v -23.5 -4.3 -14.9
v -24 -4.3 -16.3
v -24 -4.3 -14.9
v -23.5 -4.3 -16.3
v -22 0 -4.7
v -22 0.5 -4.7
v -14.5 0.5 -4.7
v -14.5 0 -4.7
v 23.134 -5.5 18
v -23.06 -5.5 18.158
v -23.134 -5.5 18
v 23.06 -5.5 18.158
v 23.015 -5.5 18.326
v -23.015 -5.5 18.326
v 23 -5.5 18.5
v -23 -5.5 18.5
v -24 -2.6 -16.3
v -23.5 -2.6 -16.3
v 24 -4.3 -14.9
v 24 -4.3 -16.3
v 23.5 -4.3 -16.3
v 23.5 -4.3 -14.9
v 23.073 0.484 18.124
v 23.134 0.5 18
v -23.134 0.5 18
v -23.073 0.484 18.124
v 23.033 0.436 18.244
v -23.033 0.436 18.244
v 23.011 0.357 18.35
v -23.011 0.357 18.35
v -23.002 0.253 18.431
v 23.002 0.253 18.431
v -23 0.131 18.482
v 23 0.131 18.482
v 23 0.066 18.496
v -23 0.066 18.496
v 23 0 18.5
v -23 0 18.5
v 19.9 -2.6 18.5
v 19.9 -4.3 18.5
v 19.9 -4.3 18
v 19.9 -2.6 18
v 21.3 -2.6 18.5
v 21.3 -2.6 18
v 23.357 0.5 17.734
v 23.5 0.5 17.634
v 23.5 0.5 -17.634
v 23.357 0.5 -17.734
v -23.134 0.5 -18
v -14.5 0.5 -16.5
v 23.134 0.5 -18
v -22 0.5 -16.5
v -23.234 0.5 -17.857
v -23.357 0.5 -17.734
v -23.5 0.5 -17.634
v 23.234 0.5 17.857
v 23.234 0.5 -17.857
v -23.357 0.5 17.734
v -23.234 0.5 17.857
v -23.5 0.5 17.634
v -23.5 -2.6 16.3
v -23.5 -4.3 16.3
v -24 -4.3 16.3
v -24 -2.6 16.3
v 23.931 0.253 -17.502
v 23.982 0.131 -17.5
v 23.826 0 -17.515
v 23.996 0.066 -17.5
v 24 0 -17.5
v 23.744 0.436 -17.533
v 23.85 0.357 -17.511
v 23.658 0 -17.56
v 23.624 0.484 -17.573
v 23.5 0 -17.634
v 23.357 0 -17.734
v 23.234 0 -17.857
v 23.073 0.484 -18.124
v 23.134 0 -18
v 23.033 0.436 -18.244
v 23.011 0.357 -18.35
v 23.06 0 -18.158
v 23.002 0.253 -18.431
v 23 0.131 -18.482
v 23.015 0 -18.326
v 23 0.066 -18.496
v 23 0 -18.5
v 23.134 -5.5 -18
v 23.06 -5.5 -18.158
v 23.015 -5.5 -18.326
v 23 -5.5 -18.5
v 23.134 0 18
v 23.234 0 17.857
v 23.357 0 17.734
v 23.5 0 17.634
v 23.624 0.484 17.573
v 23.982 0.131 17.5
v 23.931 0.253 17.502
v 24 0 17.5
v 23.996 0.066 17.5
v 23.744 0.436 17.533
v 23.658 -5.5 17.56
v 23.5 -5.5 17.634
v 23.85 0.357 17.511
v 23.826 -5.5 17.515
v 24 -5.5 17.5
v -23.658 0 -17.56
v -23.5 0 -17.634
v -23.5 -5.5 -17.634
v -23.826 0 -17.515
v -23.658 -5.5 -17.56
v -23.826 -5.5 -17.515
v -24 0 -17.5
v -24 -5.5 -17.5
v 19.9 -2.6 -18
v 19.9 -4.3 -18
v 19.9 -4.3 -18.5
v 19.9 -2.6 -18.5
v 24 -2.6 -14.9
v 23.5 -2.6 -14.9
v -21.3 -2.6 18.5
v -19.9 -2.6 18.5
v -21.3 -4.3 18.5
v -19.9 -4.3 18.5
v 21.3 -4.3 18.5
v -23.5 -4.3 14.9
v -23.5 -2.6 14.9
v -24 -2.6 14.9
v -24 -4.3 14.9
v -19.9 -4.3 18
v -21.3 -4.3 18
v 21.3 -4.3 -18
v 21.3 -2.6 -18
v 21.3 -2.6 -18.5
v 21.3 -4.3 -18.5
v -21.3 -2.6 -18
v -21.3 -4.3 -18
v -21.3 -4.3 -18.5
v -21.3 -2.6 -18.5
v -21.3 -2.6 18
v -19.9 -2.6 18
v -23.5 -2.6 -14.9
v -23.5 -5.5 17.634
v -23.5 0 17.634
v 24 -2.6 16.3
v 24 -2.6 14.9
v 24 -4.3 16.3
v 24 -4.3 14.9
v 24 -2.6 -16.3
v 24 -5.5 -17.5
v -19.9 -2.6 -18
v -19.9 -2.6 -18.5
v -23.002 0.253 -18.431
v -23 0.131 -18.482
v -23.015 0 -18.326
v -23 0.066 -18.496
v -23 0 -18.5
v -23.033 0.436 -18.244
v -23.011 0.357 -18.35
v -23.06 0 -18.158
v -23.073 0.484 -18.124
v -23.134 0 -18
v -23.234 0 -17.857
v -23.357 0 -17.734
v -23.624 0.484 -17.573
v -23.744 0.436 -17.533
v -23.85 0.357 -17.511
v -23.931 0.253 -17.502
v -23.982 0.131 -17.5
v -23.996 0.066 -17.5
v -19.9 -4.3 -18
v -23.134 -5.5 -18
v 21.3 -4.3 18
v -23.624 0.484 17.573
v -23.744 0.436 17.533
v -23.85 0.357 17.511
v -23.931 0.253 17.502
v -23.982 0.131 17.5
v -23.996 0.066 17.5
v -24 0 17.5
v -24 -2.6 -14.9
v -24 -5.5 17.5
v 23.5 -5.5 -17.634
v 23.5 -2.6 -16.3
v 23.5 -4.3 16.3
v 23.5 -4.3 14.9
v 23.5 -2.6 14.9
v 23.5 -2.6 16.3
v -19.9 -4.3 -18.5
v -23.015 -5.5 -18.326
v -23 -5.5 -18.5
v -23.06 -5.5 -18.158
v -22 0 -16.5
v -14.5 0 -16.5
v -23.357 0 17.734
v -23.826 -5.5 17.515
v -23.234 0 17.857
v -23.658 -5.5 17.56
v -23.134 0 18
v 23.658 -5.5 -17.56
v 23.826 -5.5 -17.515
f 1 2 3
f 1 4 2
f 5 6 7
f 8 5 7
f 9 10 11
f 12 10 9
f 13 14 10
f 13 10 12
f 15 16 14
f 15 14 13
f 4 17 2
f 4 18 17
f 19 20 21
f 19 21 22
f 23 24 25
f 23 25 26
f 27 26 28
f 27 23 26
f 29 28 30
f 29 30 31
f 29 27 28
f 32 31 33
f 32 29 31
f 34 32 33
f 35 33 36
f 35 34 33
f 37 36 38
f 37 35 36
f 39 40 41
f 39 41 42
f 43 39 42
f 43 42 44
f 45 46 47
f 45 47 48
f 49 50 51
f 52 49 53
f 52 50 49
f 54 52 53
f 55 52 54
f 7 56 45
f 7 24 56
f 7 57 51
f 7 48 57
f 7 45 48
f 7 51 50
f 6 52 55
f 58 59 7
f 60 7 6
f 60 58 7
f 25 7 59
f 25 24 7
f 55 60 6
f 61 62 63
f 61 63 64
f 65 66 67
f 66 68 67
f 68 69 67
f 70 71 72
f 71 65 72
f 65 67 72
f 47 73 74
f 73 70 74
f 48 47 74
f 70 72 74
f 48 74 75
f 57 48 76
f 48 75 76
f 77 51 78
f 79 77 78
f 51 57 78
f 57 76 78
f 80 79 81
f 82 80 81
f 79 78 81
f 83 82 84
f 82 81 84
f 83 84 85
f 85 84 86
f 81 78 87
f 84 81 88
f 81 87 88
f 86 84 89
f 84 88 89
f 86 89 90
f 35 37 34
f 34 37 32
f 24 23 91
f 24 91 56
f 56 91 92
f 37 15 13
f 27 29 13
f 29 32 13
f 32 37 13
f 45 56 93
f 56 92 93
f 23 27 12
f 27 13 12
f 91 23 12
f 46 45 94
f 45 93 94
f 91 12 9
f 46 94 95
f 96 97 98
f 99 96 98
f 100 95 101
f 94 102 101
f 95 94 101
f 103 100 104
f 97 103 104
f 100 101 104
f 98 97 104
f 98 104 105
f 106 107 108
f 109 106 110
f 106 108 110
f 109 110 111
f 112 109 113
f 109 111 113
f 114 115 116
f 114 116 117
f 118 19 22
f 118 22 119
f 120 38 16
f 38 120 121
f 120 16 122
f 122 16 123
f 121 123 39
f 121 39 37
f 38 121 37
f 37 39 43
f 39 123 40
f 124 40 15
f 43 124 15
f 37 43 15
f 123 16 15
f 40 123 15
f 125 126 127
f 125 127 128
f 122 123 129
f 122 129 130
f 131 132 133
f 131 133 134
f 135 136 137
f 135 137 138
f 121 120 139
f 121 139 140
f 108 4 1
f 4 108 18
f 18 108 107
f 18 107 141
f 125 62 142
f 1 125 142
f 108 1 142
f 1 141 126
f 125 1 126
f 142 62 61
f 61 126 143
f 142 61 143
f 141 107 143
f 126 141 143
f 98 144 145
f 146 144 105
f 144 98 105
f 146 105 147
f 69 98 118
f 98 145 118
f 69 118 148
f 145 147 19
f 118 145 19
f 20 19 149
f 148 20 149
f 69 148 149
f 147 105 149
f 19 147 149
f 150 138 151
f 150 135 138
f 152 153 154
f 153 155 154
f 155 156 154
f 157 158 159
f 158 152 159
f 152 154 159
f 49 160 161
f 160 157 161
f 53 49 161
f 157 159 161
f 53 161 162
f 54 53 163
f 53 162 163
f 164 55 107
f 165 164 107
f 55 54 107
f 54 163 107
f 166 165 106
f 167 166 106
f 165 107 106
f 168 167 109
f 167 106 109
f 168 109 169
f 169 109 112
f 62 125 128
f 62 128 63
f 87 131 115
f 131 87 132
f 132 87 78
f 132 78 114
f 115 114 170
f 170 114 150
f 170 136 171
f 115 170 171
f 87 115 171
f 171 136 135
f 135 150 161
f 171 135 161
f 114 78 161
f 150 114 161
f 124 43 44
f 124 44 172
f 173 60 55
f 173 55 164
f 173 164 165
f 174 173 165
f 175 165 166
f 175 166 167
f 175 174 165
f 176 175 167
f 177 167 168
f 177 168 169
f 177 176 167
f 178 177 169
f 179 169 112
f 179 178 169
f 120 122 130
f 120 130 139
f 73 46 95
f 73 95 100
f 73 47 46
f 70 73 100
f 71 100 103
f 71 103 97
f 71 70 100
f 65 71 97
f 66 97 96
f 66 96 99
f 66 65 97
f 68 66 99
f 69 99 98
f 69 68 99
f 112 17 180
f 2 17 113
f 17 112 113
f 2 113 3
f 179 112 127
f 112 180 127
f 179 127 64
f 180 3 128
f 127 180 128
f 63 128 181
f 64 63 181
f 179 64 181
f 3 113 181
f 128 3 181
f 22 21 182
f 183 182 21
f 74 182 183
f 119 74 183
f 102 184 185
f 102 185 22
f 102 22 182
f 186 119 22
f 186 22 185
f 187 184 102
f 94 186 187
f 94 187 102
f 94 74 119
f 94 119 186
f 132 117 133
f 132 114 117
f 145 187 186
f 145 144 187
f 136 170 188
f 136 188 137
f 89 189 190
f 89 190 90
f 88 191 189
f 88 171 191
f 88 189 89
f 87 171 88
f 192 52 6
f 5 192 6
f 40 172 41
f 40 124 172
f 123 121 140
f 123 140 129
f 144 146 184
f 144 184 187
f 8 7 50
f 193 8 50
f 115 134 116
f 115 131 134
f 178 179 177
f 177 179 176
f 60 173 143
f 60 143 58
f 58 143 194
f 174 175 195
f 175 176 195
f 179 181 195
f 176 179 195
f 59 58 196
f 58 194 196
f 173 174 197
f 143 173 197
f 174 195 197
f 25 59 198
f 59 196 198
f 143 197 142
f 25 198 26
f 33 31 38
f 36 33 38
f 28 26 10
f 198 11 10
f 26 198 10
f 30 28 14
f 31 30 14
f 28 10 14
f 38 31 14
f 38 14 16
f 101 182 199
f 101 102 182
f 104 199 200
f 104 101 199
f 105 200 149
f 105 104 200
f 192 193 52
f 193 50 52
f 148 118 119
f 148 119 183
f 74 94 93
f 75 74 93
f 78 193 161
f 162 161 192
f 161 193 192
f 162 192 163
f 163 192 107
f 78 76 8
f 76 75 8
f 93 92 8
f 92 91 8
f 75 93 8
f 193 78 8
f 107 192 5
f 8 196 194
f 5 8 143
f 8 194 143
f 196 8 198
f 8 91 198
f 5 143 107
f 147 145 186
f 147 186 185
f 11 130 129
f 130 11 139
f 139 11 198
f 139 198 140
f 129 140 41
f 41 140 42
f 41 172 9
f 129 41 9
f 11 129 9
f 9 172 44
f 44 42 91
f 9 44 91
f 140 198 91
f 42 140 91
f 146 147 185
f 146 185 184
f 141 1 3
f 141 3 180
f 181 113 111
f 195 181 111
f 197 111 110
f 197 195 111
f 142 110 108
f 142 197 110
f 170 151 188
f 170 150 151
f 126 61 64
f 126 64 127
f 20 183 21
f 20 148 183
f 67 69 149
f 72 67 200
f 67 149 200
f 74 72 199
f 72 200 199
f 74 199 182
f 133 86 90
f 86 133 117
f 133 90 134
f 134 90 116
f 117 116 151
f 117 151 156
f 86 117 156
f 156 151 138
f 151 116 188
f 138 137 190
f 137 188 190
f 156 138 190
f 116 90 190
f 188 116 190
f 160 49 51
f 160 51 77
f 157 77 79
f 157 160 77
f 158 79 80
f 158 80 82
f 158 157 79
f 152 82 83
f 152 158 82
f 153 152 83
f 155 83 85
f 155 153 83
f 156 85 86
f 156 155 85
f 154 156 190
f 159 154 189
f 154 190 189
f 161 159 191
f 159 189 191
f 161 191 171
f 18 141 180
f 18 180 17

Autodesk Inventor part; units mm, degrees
ref_plane "YZ Plane" through (0, 0, 0) normal (1, 0, 0) x (0, 1, 0)
ref_plane "XZ Plane" through (0, 0, 0) normal (0, 1, 0) x (-1, 0, 0)
ref_plane "XY Plane" through (0, 0, 0) normal (0, 0, 1) x (1, 0, 0)
sketch "Sketch3" plane through (0, 0, 0) normal (0, 1, 0) x (-1, 0, 0)
  line L0 (23, 18.5) -> (-23, 18.5)
  line L1 (-24, 17.5) -> (-24, -17.5)
  line L2 (-23, -18.5) -> (23, -18.5)
  line L3 (24, -17.5) -> (24, 17.5)
  line L4 (24, 18.5) -> (-24, -18.5) construction
  circle A0 centre (24, 18.5) radius 1
  circle A1 centre (24, -18.5) radius 1
  circle A2 centre (-24, -18.5) radius 1
  circle A3 centre (-24, 18.5) radius 1
  point P0 (0, 0)
  dimension "d21" = 2
  dimension "d22" = 2
  dimension "d23" = 2
  dimension "d24" = 2
extrude "Extrusion3" add sketch "Sketch3" along normal blind 0.5 contours A0 L3 A1 L2 A2 L1 A3 L0
sketch "Sketch6" plane through (0, 0, 0) normal (0, -1, 0) x (1, 0, 0)
  line L0 (-23, 18.5) -> (23, 18.5) projected
  line L1 (-23, 18.5) -> (23, 18.5)
  line L2 (24, 17.5) -> (24, -17.5) projected
  line L3 (24, 17.5) -> (24, -17.5)
  line L4 (-24, -17.5) -> (-24, 17.5) projected
  line L5 (-24, -17.5) -> (-24, 17.5)
  circle A0 centre (-24, 18.5) radius 1
  circle A1 centre (24, 18.5) radius 1
  circle A2 centre (24, -18.5) radius 1
  circle A3 centre (-24, -18.5) radius 1
  line L6 (23.5, -17.634) -> (23.5, 17.634)
  line L7 (-23.134, 18) -> (23.134, 18)
  line L8 (-23.5, -17.634) -> (-23.5, 17.634)
  line L9 (23, -18.5) -> (-23, -18.5) projected
  line L10 (-23, -18.5) -> (23, -18.5)
  line L11 (23.134, -18) -> (-23.134, -18)
  point P0 (0, 0)
  dimension "d45" = 0.5
  dimension "d46" = 0.5
  dimension "d48" = 2
  dimension "d49" = 0.5
extrude "Extrusion5" add sketch "Sketch6" along normal blind 5.5 contours L0 A1 L7 A0 | A0 L8 A3 L4 | L2 A2 L6 A1 | A3 L11 A2 L9
sketch "Sketch7" plane through (-23, 0.5, 18.5) normal (0, 0, 1) x (1, 0, 0)
  line L0 (42.9, -3.1) -> (44.3, -3.1)
  line L1 (44.3, -3.1) -> (44.3, -4.8)
  line L2 (44.3, -4.8) -> (42.9, -4.8)
  line L3 (42.9, -4.8) -> (42.9, -3.1)
  line L4 (0, 0) -> (46, 0) projected
  line L5 (46, -6) -> (46, 0) projected
  line L6 (1.7, -3.1) -> (3.1, -3.1)
  line L7 (3.1, -3.1) -> (3.1, -4.8)
  line L8 (3.1, -4.8) -> (1.7, -4.8)
  line L9 (1.7, -4.8) -> (1.7, -3.1)
  line L10 (0, 0) -> (0, -6) projected
  point P0 (23, -0.5)
  dimension "d52" = 1.4
  dimension "d53" = 1.7
  dimension "d54" = 3.1
  dimension "d55" = 1.7
  dimension "d56" = 1.4
  dimension "d57" = 1.7
  dimension "d58" = 3.1
  dimension "d59" = 1.7
extrude "Extrusion6" cut sketch "Sketch7" against normal up to surface (37 mm away)
sketch "Sketch8" plane through (24, 0.5, 17.5) normal (1, 0, 0) x (0, 0, -1)
  line L0 (32.4, -3.1) -> (33.8, -3.1)
  line L1 (33.8, -3.1) -> (33.8, -4.8)
  line L2 (33.8, -4.8) -> (32.4, -4.8)
  line L3 (32.4, -4.8) -> (32.4, -3.1)
  line L4 (0, 0) -> (35, 0) projected
  line L5 (35, -6) -> (35, 0) projected
  line L6 (1.2, -3.1) -> (2.6, -3.1)
  line L7 (2.6, -3.1) -> (2.6, -4.8)
  line L8 (2.6, -4.8) -> (1.2, -4.8)
  line L9 (1.2, -4.8) -> (1.2, -3.1)
  line L10 (0, -6) -> (0, 0) projected
  point P0 (17.5, -0.5)
  dimension "d62" = 1.4
  dimension "d63" = 1.7
  dimension "d64" = 3.1
  dimension "d65" = 1.2
  dimension "d66" = 1.4
  dimension "d67" = 1.7
  dimension "d68" = 3.1
  dimension "d69" = 1.2
extrude "Extrusion7" cut sketch "Sketch8" against normal up to surface (48 mm away)
sketch "Sketch9" plane through (0, 0.5, 0) normal (0, 1, 0) x (1, 0, 0)
  line L0 (-22, 4.7) -> (-14.5, 4.7)
  line L1 (-14.5, 4.7) -> (-14.5, 16.5)
  line L2 (-14.5, 16.5) -> (-22, 16.5)
  line L3 (-22, 16.5) -> (-22, 4.7)
  line L4 (-24, 17.5) -> (-24, -17.5) projected
  line L5 (23, 18.5) -> (-23, 18.5) projected
  point P0 (0, 0)
  dimension "d74" = 7.5
  dimension "d75" = 11.8
  dimension "d76" = 2
  dimension "d77" = 2
extrude "Extrusion8" cut sketch "Sketch9" against normal up to surface (0.5 mm away)
fillet "Fillet1" radius 0.5 4 edges at (0, 0.5, -18.5) (24, 0.5, 0) (0, 0.5, 18.5) (-24, 0.5, 0)
properties part number "metal_cover_connector"
